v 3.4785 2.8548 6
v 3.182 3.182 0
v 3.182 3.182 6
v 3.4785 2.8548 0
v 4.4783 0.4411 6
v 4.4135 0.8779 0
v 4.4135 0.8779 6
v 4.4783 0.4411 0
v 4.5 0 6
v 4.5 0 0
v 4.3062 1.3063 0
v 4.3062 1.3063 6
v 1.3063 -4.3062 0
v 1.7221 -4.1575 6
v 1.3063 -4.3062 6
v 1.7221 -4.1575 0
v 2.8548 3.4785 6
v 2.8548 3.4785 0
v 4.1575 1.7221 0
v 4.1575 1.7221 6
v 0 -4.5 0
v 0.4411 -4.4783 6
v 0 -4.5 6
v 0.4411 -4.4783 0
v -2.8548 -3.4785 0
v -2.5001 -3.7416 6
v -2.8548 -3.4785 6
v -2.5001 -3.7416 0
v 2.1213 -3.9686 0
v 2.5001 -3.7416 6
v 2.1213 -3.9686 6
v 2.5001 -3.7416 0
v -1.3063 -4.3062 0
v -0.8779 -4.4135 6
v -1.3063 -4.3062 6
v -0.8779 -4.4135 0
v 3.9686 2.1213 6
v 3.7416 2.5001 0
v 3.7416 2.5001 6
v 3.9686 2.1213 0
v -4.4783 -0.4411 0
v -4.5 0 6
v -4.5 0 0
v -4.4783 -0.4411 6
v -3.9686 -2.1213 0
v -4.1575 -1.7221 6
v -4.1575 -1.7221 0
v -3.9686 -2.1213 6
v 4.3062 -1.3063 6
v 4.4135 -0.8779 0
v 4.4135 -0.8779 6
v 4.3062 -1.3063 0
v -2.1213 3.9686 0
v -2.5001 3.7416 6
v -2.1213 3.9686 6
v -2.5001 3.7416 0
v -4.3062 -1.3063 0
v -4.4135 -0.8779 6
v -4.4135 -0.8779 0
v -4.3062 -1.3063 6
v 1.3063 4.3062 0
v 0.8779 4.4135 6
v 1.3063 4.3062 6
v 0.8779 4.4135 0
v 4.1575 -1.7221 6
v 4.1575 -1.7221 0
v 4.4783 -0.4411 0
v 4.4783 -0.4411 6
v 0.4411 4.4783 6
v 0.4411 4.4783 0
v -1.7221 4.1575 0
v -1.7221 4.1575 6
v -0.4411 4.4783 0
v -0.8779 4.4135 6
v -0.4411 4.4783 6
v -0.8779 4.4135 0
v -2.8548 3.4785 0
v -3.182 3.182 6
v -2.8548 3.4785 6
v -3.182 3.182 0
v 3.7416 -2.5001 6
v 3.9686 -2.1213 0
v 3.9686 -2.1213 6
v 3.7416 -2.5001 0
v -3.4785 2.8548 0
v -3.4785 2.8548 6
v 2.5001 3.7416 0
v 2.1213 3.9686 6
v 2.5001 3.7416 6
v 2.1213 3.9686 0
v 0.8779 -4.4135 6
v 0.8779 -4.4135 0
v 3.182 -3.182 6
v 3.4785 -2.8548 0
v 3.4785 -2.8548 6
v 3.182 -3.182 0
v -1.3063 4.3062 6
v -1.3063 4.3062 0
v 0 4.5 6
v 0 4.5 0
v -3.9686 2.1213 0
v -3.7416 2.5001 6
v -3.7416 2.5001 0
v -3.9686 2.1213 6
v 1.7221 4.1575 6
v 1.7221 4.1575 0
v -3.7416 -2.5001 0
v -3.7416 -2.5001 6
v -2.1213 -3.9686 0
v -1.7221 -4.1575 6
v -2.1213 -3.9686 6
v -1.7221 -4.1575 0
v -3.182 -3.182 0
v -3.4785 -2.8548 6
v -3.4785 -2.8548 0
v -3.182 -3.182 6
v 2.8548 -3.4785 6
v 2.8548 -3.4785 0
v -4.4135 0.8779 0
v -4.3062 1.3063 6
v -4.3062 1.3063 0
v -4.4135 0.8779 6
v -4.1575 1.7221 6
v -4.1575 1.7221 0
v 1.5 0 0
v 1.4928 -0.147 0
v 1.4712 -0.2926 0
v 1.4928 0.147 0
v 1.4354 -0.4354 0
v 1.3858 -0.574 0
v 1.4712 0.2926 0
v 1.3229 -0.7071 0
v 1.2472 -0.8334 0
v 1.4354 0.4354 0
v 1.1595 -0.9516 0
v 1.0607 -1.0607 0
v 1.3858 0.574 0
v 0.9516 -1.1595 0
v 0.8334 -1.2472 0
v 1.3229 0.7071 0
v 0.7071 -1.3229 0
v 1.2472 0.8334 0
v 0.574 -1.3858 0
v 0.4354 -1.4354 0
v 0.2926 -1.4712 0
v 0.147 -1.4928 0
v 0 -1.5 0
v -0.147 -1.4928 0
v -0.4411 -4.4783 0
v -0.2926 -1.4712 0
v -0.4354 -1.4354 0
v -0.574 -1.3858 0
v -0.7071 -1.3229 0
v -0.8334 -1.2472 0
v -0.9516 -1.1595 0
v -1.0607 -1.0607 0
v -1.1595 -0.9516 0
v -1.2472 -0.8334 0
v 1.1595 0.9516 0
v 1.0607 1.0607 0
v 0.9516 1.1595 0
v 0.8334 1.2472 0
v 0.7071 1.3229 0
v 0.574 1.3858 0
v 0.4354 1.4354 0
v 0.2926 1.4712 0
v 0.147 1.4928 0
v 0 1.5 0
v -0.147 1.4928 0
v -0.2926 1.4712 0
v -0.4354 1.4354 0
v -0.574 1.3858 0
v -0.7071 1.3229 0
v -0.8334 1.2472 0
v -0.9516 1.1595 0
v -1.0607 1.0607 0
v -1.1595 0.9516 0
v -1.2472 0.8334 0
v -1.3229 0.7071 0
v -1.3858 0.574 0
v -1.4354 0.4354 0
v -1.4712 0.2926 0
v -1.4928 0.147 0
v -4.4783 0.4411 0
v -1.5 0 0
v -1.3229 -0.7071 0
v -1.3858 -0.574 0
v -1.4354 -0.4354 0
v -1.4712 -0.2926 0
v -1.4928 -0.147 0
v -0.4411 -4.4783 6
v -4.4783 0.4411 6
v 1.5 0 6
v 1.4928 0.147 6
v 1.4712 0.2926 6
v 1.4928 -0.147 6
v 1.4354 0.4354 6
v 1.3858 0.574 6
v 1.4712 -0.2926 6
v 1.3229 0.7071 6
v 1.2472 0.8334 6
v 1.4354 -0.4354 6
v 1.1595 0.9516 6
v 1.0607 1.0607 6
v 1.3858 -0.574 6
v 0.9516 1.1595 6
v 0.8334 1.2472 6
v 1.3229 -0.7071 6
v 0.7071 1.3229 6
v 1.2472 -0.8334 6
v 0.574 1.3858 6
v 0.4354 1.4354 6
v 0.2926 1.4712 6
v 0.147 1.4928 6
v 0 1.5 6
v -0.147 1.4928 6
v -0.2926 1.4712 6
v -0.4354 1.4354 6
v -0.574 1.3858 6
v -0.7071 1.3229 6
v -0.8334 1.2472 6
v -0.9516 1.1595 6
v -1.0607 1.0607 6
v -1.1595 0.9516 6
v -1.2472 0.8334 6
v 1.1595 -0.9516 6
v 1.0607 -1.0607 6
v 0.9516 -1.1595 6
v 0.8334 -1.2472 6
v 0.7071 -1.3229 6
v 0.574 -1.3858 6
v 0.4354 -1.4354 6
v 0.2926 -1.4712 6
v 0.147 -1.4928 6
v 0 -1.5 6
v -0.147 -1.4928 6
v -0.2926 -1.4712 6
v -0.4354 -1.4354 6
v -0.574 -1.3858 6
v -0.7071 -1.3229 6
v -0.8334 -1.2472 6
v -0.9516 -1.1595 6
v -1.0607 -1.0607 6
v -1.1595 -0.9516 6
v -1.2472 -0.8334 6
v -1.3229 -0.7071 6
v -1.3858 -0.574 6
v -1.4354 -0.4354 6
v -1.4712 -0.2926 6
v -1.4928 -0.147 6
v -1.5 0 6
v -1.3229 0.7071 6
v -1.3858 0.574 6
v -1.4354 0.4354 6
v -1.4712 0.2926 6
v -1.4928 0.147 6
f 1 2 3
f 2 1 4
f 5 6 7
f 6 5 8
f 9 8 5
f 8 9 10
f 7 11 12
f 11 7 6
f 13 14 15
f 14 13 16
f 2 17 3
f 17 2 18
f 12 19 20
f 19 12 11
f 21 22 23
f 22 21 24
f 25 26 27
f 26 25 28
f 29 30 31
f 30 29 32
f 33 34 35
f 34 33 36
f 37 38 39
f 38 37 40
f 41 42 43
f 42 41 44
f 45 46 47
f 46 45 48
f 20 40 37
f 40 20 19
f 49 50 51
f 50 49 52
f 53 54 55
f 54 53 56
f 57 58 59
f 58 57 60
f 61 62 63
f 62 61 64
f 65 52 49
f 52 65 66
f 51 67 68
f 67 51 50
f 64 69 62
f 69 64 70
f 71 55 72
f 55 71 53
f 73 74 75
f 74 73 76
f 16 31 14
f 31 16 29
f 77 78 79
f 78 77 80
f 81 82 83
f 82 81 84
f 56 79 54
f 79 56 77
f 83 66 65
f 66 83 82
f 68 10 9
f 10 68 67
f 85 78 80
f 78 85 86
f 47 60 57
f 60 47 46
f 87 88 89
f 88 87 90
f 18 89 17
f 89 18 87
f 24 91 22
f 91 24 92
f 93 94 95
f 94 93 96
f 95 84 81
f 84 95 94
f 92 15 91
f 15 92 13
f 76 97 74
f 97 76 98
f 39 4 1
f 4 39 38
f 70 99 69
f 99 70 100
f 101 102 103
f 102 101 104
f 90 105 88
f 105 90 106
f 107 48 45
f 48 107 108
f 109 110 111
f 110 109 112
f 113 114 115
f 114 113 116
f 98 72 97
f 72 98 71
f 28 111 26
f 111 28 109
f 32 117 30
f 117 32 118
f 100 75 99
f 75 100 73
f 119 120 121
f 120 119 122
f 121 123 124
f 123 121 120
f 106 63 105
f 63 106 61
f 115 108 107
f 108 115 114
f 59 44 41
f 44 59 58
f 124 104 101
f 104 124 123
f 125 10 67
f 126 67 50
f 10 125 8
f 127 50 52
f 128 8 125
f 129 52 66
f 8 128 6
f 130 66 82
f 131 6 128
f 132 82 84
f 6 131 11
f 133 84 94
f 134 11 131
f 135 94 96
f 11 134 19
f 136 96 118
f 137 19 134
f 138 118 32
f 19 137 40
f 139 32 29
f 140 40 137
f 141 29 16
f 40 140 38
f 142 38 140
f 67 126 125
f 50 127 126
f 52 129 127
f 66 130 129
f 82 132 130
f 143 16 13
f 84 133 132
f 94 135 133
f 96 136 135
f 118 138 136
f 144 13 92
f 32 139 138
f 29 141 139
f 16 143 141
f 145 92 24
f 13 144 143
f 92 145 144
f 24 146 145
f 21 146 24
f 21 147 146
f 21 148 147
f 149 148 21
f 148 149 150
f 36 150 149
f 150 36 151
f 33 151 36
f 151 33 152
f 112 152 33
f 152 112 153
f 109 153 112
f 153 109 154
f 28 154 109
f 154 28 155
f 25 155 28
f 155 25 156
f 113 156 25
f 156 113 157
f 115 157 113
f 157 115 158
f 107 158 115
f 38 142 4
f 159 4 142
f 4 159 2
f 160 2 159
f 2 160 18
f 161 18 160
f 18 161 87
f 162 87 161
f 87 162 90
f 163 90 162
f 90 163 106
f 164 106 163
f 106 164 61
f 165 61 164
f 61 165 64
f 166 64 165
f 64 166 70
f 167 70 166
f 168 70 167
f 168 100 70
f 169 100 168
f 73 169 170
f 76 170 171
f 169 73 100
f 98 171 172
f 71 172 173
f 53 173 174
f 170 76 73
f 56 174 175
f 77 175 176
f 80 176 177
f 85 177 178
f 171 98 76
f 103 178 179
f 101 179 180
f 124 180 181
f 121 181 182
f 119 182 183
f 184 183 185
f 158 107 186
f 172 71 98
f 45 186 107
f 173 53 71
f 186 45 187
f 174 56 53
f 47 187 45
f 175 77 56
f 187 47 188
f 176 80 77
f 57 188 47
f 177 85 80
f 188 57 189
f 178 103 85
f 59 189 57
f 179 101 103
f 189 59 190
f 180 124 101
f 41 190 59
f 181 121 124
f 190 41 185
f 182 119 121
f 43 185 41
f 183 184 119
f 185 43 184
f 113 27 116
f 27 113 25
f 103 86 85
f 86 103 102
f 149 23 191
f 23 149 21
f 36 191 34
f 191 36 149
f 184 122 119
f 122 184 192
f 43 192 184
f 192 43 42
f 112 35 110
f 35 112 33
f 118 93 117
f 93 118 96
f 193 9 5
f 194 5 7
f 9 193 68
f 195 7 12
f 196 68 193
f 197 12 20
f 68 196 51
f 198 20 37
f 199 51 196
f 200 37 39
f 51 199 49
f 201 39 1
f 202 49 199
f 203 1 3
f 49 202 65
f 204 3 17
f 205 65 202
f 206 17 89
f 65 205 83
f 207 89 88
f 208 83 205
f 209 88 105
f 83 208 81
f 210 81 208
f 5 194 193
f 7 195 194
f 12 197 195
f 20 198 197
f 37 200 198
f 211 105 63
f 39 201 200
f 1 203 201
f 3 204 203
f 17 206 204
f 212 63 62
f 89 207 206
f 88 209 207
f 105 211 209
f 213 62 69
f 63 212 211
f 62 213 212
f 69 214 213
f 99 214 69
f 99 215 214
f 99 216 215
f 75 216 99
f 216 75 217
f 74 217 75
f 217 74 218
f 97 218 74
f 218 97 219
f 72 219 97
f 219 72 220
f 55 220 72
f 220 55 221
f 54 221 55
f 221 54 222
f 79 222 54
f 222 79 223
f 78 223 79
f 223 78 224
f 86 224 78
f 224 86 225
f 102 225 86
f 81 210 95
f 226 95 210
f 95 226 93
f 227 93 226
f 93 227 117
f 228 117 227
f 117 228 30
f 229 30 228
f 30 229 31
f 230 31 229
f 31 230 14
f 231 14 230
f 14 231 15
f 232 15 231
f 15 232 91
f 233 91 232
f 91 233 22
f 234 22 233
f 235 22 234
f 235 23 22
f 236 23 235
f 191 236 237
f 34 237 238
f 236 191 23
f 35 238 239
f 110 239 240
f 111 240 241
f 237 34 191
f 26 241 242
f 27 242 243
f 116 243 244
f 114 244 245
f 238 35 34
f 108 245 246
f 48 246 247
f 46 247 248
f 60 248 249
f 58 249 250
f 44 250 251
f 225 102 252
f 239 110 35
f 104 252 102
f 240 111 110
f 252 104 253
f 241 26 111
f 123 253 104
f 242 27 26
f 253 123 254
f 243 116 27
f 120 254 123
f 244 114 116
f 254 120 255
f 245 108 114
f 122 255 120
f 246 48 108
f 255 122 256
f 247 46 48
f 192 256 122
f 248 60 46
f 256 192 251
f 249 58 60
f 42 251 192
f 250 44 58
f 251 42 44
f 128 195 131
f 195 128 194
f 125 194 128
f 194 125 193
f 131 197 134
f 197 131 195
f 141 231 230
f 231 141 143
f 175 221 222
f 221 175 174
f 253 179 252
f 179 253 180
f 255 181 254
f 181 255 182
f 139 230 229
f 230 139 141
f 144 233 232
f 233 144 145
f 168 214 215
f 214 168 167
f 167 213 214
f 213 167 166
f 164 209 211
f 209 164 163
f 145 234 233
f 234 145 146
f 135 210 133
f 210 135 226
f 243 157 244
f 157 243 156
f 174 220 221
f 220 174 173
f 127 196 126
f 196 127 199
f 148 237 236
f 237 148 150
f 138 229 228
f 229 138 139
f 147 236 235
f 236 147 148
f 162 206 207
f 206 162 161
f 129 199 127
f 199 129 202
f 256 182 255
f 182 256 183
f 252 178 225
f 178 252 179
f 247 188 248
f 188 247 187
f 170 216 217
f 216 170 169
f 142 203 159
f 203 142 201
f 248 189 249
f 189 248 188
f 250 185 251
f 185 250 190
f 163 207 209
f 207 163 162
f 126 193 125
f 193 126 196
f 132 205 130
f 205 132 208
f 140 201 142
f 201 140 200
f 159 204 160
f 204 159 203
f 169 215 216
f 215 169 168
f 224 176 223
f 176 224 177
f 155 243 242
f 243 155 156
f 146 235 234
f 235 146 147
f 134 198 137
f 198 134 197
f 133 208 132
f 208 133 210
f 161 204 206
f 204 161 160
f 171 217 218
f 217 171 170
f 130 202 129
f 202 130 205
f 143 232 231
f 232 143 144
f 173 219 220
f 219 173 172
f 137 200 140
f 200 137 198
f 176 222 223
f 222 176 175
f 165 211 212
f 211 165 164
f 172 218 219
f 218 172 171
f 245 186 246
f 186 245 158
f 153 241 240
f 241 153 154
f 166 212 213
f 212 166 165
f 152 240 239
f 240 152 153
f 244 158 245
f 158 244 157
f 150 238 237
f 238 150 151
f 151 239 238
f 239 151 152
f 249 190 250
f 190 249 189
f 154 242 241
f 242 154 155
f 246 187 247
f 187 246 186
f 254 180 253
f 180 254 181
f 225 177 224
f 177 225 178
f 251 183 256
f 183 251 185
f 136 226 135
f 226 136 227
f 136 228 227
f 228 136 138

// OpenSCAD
module standoff_pillar() {
    difference() {
        cylinder(h=6.0, d=9.0, $fn=64);
        translate([0, 0, -1])
            cylinder(h=8.0, d=3.0, $fn=64);
    }
}

standoff_pillar();
